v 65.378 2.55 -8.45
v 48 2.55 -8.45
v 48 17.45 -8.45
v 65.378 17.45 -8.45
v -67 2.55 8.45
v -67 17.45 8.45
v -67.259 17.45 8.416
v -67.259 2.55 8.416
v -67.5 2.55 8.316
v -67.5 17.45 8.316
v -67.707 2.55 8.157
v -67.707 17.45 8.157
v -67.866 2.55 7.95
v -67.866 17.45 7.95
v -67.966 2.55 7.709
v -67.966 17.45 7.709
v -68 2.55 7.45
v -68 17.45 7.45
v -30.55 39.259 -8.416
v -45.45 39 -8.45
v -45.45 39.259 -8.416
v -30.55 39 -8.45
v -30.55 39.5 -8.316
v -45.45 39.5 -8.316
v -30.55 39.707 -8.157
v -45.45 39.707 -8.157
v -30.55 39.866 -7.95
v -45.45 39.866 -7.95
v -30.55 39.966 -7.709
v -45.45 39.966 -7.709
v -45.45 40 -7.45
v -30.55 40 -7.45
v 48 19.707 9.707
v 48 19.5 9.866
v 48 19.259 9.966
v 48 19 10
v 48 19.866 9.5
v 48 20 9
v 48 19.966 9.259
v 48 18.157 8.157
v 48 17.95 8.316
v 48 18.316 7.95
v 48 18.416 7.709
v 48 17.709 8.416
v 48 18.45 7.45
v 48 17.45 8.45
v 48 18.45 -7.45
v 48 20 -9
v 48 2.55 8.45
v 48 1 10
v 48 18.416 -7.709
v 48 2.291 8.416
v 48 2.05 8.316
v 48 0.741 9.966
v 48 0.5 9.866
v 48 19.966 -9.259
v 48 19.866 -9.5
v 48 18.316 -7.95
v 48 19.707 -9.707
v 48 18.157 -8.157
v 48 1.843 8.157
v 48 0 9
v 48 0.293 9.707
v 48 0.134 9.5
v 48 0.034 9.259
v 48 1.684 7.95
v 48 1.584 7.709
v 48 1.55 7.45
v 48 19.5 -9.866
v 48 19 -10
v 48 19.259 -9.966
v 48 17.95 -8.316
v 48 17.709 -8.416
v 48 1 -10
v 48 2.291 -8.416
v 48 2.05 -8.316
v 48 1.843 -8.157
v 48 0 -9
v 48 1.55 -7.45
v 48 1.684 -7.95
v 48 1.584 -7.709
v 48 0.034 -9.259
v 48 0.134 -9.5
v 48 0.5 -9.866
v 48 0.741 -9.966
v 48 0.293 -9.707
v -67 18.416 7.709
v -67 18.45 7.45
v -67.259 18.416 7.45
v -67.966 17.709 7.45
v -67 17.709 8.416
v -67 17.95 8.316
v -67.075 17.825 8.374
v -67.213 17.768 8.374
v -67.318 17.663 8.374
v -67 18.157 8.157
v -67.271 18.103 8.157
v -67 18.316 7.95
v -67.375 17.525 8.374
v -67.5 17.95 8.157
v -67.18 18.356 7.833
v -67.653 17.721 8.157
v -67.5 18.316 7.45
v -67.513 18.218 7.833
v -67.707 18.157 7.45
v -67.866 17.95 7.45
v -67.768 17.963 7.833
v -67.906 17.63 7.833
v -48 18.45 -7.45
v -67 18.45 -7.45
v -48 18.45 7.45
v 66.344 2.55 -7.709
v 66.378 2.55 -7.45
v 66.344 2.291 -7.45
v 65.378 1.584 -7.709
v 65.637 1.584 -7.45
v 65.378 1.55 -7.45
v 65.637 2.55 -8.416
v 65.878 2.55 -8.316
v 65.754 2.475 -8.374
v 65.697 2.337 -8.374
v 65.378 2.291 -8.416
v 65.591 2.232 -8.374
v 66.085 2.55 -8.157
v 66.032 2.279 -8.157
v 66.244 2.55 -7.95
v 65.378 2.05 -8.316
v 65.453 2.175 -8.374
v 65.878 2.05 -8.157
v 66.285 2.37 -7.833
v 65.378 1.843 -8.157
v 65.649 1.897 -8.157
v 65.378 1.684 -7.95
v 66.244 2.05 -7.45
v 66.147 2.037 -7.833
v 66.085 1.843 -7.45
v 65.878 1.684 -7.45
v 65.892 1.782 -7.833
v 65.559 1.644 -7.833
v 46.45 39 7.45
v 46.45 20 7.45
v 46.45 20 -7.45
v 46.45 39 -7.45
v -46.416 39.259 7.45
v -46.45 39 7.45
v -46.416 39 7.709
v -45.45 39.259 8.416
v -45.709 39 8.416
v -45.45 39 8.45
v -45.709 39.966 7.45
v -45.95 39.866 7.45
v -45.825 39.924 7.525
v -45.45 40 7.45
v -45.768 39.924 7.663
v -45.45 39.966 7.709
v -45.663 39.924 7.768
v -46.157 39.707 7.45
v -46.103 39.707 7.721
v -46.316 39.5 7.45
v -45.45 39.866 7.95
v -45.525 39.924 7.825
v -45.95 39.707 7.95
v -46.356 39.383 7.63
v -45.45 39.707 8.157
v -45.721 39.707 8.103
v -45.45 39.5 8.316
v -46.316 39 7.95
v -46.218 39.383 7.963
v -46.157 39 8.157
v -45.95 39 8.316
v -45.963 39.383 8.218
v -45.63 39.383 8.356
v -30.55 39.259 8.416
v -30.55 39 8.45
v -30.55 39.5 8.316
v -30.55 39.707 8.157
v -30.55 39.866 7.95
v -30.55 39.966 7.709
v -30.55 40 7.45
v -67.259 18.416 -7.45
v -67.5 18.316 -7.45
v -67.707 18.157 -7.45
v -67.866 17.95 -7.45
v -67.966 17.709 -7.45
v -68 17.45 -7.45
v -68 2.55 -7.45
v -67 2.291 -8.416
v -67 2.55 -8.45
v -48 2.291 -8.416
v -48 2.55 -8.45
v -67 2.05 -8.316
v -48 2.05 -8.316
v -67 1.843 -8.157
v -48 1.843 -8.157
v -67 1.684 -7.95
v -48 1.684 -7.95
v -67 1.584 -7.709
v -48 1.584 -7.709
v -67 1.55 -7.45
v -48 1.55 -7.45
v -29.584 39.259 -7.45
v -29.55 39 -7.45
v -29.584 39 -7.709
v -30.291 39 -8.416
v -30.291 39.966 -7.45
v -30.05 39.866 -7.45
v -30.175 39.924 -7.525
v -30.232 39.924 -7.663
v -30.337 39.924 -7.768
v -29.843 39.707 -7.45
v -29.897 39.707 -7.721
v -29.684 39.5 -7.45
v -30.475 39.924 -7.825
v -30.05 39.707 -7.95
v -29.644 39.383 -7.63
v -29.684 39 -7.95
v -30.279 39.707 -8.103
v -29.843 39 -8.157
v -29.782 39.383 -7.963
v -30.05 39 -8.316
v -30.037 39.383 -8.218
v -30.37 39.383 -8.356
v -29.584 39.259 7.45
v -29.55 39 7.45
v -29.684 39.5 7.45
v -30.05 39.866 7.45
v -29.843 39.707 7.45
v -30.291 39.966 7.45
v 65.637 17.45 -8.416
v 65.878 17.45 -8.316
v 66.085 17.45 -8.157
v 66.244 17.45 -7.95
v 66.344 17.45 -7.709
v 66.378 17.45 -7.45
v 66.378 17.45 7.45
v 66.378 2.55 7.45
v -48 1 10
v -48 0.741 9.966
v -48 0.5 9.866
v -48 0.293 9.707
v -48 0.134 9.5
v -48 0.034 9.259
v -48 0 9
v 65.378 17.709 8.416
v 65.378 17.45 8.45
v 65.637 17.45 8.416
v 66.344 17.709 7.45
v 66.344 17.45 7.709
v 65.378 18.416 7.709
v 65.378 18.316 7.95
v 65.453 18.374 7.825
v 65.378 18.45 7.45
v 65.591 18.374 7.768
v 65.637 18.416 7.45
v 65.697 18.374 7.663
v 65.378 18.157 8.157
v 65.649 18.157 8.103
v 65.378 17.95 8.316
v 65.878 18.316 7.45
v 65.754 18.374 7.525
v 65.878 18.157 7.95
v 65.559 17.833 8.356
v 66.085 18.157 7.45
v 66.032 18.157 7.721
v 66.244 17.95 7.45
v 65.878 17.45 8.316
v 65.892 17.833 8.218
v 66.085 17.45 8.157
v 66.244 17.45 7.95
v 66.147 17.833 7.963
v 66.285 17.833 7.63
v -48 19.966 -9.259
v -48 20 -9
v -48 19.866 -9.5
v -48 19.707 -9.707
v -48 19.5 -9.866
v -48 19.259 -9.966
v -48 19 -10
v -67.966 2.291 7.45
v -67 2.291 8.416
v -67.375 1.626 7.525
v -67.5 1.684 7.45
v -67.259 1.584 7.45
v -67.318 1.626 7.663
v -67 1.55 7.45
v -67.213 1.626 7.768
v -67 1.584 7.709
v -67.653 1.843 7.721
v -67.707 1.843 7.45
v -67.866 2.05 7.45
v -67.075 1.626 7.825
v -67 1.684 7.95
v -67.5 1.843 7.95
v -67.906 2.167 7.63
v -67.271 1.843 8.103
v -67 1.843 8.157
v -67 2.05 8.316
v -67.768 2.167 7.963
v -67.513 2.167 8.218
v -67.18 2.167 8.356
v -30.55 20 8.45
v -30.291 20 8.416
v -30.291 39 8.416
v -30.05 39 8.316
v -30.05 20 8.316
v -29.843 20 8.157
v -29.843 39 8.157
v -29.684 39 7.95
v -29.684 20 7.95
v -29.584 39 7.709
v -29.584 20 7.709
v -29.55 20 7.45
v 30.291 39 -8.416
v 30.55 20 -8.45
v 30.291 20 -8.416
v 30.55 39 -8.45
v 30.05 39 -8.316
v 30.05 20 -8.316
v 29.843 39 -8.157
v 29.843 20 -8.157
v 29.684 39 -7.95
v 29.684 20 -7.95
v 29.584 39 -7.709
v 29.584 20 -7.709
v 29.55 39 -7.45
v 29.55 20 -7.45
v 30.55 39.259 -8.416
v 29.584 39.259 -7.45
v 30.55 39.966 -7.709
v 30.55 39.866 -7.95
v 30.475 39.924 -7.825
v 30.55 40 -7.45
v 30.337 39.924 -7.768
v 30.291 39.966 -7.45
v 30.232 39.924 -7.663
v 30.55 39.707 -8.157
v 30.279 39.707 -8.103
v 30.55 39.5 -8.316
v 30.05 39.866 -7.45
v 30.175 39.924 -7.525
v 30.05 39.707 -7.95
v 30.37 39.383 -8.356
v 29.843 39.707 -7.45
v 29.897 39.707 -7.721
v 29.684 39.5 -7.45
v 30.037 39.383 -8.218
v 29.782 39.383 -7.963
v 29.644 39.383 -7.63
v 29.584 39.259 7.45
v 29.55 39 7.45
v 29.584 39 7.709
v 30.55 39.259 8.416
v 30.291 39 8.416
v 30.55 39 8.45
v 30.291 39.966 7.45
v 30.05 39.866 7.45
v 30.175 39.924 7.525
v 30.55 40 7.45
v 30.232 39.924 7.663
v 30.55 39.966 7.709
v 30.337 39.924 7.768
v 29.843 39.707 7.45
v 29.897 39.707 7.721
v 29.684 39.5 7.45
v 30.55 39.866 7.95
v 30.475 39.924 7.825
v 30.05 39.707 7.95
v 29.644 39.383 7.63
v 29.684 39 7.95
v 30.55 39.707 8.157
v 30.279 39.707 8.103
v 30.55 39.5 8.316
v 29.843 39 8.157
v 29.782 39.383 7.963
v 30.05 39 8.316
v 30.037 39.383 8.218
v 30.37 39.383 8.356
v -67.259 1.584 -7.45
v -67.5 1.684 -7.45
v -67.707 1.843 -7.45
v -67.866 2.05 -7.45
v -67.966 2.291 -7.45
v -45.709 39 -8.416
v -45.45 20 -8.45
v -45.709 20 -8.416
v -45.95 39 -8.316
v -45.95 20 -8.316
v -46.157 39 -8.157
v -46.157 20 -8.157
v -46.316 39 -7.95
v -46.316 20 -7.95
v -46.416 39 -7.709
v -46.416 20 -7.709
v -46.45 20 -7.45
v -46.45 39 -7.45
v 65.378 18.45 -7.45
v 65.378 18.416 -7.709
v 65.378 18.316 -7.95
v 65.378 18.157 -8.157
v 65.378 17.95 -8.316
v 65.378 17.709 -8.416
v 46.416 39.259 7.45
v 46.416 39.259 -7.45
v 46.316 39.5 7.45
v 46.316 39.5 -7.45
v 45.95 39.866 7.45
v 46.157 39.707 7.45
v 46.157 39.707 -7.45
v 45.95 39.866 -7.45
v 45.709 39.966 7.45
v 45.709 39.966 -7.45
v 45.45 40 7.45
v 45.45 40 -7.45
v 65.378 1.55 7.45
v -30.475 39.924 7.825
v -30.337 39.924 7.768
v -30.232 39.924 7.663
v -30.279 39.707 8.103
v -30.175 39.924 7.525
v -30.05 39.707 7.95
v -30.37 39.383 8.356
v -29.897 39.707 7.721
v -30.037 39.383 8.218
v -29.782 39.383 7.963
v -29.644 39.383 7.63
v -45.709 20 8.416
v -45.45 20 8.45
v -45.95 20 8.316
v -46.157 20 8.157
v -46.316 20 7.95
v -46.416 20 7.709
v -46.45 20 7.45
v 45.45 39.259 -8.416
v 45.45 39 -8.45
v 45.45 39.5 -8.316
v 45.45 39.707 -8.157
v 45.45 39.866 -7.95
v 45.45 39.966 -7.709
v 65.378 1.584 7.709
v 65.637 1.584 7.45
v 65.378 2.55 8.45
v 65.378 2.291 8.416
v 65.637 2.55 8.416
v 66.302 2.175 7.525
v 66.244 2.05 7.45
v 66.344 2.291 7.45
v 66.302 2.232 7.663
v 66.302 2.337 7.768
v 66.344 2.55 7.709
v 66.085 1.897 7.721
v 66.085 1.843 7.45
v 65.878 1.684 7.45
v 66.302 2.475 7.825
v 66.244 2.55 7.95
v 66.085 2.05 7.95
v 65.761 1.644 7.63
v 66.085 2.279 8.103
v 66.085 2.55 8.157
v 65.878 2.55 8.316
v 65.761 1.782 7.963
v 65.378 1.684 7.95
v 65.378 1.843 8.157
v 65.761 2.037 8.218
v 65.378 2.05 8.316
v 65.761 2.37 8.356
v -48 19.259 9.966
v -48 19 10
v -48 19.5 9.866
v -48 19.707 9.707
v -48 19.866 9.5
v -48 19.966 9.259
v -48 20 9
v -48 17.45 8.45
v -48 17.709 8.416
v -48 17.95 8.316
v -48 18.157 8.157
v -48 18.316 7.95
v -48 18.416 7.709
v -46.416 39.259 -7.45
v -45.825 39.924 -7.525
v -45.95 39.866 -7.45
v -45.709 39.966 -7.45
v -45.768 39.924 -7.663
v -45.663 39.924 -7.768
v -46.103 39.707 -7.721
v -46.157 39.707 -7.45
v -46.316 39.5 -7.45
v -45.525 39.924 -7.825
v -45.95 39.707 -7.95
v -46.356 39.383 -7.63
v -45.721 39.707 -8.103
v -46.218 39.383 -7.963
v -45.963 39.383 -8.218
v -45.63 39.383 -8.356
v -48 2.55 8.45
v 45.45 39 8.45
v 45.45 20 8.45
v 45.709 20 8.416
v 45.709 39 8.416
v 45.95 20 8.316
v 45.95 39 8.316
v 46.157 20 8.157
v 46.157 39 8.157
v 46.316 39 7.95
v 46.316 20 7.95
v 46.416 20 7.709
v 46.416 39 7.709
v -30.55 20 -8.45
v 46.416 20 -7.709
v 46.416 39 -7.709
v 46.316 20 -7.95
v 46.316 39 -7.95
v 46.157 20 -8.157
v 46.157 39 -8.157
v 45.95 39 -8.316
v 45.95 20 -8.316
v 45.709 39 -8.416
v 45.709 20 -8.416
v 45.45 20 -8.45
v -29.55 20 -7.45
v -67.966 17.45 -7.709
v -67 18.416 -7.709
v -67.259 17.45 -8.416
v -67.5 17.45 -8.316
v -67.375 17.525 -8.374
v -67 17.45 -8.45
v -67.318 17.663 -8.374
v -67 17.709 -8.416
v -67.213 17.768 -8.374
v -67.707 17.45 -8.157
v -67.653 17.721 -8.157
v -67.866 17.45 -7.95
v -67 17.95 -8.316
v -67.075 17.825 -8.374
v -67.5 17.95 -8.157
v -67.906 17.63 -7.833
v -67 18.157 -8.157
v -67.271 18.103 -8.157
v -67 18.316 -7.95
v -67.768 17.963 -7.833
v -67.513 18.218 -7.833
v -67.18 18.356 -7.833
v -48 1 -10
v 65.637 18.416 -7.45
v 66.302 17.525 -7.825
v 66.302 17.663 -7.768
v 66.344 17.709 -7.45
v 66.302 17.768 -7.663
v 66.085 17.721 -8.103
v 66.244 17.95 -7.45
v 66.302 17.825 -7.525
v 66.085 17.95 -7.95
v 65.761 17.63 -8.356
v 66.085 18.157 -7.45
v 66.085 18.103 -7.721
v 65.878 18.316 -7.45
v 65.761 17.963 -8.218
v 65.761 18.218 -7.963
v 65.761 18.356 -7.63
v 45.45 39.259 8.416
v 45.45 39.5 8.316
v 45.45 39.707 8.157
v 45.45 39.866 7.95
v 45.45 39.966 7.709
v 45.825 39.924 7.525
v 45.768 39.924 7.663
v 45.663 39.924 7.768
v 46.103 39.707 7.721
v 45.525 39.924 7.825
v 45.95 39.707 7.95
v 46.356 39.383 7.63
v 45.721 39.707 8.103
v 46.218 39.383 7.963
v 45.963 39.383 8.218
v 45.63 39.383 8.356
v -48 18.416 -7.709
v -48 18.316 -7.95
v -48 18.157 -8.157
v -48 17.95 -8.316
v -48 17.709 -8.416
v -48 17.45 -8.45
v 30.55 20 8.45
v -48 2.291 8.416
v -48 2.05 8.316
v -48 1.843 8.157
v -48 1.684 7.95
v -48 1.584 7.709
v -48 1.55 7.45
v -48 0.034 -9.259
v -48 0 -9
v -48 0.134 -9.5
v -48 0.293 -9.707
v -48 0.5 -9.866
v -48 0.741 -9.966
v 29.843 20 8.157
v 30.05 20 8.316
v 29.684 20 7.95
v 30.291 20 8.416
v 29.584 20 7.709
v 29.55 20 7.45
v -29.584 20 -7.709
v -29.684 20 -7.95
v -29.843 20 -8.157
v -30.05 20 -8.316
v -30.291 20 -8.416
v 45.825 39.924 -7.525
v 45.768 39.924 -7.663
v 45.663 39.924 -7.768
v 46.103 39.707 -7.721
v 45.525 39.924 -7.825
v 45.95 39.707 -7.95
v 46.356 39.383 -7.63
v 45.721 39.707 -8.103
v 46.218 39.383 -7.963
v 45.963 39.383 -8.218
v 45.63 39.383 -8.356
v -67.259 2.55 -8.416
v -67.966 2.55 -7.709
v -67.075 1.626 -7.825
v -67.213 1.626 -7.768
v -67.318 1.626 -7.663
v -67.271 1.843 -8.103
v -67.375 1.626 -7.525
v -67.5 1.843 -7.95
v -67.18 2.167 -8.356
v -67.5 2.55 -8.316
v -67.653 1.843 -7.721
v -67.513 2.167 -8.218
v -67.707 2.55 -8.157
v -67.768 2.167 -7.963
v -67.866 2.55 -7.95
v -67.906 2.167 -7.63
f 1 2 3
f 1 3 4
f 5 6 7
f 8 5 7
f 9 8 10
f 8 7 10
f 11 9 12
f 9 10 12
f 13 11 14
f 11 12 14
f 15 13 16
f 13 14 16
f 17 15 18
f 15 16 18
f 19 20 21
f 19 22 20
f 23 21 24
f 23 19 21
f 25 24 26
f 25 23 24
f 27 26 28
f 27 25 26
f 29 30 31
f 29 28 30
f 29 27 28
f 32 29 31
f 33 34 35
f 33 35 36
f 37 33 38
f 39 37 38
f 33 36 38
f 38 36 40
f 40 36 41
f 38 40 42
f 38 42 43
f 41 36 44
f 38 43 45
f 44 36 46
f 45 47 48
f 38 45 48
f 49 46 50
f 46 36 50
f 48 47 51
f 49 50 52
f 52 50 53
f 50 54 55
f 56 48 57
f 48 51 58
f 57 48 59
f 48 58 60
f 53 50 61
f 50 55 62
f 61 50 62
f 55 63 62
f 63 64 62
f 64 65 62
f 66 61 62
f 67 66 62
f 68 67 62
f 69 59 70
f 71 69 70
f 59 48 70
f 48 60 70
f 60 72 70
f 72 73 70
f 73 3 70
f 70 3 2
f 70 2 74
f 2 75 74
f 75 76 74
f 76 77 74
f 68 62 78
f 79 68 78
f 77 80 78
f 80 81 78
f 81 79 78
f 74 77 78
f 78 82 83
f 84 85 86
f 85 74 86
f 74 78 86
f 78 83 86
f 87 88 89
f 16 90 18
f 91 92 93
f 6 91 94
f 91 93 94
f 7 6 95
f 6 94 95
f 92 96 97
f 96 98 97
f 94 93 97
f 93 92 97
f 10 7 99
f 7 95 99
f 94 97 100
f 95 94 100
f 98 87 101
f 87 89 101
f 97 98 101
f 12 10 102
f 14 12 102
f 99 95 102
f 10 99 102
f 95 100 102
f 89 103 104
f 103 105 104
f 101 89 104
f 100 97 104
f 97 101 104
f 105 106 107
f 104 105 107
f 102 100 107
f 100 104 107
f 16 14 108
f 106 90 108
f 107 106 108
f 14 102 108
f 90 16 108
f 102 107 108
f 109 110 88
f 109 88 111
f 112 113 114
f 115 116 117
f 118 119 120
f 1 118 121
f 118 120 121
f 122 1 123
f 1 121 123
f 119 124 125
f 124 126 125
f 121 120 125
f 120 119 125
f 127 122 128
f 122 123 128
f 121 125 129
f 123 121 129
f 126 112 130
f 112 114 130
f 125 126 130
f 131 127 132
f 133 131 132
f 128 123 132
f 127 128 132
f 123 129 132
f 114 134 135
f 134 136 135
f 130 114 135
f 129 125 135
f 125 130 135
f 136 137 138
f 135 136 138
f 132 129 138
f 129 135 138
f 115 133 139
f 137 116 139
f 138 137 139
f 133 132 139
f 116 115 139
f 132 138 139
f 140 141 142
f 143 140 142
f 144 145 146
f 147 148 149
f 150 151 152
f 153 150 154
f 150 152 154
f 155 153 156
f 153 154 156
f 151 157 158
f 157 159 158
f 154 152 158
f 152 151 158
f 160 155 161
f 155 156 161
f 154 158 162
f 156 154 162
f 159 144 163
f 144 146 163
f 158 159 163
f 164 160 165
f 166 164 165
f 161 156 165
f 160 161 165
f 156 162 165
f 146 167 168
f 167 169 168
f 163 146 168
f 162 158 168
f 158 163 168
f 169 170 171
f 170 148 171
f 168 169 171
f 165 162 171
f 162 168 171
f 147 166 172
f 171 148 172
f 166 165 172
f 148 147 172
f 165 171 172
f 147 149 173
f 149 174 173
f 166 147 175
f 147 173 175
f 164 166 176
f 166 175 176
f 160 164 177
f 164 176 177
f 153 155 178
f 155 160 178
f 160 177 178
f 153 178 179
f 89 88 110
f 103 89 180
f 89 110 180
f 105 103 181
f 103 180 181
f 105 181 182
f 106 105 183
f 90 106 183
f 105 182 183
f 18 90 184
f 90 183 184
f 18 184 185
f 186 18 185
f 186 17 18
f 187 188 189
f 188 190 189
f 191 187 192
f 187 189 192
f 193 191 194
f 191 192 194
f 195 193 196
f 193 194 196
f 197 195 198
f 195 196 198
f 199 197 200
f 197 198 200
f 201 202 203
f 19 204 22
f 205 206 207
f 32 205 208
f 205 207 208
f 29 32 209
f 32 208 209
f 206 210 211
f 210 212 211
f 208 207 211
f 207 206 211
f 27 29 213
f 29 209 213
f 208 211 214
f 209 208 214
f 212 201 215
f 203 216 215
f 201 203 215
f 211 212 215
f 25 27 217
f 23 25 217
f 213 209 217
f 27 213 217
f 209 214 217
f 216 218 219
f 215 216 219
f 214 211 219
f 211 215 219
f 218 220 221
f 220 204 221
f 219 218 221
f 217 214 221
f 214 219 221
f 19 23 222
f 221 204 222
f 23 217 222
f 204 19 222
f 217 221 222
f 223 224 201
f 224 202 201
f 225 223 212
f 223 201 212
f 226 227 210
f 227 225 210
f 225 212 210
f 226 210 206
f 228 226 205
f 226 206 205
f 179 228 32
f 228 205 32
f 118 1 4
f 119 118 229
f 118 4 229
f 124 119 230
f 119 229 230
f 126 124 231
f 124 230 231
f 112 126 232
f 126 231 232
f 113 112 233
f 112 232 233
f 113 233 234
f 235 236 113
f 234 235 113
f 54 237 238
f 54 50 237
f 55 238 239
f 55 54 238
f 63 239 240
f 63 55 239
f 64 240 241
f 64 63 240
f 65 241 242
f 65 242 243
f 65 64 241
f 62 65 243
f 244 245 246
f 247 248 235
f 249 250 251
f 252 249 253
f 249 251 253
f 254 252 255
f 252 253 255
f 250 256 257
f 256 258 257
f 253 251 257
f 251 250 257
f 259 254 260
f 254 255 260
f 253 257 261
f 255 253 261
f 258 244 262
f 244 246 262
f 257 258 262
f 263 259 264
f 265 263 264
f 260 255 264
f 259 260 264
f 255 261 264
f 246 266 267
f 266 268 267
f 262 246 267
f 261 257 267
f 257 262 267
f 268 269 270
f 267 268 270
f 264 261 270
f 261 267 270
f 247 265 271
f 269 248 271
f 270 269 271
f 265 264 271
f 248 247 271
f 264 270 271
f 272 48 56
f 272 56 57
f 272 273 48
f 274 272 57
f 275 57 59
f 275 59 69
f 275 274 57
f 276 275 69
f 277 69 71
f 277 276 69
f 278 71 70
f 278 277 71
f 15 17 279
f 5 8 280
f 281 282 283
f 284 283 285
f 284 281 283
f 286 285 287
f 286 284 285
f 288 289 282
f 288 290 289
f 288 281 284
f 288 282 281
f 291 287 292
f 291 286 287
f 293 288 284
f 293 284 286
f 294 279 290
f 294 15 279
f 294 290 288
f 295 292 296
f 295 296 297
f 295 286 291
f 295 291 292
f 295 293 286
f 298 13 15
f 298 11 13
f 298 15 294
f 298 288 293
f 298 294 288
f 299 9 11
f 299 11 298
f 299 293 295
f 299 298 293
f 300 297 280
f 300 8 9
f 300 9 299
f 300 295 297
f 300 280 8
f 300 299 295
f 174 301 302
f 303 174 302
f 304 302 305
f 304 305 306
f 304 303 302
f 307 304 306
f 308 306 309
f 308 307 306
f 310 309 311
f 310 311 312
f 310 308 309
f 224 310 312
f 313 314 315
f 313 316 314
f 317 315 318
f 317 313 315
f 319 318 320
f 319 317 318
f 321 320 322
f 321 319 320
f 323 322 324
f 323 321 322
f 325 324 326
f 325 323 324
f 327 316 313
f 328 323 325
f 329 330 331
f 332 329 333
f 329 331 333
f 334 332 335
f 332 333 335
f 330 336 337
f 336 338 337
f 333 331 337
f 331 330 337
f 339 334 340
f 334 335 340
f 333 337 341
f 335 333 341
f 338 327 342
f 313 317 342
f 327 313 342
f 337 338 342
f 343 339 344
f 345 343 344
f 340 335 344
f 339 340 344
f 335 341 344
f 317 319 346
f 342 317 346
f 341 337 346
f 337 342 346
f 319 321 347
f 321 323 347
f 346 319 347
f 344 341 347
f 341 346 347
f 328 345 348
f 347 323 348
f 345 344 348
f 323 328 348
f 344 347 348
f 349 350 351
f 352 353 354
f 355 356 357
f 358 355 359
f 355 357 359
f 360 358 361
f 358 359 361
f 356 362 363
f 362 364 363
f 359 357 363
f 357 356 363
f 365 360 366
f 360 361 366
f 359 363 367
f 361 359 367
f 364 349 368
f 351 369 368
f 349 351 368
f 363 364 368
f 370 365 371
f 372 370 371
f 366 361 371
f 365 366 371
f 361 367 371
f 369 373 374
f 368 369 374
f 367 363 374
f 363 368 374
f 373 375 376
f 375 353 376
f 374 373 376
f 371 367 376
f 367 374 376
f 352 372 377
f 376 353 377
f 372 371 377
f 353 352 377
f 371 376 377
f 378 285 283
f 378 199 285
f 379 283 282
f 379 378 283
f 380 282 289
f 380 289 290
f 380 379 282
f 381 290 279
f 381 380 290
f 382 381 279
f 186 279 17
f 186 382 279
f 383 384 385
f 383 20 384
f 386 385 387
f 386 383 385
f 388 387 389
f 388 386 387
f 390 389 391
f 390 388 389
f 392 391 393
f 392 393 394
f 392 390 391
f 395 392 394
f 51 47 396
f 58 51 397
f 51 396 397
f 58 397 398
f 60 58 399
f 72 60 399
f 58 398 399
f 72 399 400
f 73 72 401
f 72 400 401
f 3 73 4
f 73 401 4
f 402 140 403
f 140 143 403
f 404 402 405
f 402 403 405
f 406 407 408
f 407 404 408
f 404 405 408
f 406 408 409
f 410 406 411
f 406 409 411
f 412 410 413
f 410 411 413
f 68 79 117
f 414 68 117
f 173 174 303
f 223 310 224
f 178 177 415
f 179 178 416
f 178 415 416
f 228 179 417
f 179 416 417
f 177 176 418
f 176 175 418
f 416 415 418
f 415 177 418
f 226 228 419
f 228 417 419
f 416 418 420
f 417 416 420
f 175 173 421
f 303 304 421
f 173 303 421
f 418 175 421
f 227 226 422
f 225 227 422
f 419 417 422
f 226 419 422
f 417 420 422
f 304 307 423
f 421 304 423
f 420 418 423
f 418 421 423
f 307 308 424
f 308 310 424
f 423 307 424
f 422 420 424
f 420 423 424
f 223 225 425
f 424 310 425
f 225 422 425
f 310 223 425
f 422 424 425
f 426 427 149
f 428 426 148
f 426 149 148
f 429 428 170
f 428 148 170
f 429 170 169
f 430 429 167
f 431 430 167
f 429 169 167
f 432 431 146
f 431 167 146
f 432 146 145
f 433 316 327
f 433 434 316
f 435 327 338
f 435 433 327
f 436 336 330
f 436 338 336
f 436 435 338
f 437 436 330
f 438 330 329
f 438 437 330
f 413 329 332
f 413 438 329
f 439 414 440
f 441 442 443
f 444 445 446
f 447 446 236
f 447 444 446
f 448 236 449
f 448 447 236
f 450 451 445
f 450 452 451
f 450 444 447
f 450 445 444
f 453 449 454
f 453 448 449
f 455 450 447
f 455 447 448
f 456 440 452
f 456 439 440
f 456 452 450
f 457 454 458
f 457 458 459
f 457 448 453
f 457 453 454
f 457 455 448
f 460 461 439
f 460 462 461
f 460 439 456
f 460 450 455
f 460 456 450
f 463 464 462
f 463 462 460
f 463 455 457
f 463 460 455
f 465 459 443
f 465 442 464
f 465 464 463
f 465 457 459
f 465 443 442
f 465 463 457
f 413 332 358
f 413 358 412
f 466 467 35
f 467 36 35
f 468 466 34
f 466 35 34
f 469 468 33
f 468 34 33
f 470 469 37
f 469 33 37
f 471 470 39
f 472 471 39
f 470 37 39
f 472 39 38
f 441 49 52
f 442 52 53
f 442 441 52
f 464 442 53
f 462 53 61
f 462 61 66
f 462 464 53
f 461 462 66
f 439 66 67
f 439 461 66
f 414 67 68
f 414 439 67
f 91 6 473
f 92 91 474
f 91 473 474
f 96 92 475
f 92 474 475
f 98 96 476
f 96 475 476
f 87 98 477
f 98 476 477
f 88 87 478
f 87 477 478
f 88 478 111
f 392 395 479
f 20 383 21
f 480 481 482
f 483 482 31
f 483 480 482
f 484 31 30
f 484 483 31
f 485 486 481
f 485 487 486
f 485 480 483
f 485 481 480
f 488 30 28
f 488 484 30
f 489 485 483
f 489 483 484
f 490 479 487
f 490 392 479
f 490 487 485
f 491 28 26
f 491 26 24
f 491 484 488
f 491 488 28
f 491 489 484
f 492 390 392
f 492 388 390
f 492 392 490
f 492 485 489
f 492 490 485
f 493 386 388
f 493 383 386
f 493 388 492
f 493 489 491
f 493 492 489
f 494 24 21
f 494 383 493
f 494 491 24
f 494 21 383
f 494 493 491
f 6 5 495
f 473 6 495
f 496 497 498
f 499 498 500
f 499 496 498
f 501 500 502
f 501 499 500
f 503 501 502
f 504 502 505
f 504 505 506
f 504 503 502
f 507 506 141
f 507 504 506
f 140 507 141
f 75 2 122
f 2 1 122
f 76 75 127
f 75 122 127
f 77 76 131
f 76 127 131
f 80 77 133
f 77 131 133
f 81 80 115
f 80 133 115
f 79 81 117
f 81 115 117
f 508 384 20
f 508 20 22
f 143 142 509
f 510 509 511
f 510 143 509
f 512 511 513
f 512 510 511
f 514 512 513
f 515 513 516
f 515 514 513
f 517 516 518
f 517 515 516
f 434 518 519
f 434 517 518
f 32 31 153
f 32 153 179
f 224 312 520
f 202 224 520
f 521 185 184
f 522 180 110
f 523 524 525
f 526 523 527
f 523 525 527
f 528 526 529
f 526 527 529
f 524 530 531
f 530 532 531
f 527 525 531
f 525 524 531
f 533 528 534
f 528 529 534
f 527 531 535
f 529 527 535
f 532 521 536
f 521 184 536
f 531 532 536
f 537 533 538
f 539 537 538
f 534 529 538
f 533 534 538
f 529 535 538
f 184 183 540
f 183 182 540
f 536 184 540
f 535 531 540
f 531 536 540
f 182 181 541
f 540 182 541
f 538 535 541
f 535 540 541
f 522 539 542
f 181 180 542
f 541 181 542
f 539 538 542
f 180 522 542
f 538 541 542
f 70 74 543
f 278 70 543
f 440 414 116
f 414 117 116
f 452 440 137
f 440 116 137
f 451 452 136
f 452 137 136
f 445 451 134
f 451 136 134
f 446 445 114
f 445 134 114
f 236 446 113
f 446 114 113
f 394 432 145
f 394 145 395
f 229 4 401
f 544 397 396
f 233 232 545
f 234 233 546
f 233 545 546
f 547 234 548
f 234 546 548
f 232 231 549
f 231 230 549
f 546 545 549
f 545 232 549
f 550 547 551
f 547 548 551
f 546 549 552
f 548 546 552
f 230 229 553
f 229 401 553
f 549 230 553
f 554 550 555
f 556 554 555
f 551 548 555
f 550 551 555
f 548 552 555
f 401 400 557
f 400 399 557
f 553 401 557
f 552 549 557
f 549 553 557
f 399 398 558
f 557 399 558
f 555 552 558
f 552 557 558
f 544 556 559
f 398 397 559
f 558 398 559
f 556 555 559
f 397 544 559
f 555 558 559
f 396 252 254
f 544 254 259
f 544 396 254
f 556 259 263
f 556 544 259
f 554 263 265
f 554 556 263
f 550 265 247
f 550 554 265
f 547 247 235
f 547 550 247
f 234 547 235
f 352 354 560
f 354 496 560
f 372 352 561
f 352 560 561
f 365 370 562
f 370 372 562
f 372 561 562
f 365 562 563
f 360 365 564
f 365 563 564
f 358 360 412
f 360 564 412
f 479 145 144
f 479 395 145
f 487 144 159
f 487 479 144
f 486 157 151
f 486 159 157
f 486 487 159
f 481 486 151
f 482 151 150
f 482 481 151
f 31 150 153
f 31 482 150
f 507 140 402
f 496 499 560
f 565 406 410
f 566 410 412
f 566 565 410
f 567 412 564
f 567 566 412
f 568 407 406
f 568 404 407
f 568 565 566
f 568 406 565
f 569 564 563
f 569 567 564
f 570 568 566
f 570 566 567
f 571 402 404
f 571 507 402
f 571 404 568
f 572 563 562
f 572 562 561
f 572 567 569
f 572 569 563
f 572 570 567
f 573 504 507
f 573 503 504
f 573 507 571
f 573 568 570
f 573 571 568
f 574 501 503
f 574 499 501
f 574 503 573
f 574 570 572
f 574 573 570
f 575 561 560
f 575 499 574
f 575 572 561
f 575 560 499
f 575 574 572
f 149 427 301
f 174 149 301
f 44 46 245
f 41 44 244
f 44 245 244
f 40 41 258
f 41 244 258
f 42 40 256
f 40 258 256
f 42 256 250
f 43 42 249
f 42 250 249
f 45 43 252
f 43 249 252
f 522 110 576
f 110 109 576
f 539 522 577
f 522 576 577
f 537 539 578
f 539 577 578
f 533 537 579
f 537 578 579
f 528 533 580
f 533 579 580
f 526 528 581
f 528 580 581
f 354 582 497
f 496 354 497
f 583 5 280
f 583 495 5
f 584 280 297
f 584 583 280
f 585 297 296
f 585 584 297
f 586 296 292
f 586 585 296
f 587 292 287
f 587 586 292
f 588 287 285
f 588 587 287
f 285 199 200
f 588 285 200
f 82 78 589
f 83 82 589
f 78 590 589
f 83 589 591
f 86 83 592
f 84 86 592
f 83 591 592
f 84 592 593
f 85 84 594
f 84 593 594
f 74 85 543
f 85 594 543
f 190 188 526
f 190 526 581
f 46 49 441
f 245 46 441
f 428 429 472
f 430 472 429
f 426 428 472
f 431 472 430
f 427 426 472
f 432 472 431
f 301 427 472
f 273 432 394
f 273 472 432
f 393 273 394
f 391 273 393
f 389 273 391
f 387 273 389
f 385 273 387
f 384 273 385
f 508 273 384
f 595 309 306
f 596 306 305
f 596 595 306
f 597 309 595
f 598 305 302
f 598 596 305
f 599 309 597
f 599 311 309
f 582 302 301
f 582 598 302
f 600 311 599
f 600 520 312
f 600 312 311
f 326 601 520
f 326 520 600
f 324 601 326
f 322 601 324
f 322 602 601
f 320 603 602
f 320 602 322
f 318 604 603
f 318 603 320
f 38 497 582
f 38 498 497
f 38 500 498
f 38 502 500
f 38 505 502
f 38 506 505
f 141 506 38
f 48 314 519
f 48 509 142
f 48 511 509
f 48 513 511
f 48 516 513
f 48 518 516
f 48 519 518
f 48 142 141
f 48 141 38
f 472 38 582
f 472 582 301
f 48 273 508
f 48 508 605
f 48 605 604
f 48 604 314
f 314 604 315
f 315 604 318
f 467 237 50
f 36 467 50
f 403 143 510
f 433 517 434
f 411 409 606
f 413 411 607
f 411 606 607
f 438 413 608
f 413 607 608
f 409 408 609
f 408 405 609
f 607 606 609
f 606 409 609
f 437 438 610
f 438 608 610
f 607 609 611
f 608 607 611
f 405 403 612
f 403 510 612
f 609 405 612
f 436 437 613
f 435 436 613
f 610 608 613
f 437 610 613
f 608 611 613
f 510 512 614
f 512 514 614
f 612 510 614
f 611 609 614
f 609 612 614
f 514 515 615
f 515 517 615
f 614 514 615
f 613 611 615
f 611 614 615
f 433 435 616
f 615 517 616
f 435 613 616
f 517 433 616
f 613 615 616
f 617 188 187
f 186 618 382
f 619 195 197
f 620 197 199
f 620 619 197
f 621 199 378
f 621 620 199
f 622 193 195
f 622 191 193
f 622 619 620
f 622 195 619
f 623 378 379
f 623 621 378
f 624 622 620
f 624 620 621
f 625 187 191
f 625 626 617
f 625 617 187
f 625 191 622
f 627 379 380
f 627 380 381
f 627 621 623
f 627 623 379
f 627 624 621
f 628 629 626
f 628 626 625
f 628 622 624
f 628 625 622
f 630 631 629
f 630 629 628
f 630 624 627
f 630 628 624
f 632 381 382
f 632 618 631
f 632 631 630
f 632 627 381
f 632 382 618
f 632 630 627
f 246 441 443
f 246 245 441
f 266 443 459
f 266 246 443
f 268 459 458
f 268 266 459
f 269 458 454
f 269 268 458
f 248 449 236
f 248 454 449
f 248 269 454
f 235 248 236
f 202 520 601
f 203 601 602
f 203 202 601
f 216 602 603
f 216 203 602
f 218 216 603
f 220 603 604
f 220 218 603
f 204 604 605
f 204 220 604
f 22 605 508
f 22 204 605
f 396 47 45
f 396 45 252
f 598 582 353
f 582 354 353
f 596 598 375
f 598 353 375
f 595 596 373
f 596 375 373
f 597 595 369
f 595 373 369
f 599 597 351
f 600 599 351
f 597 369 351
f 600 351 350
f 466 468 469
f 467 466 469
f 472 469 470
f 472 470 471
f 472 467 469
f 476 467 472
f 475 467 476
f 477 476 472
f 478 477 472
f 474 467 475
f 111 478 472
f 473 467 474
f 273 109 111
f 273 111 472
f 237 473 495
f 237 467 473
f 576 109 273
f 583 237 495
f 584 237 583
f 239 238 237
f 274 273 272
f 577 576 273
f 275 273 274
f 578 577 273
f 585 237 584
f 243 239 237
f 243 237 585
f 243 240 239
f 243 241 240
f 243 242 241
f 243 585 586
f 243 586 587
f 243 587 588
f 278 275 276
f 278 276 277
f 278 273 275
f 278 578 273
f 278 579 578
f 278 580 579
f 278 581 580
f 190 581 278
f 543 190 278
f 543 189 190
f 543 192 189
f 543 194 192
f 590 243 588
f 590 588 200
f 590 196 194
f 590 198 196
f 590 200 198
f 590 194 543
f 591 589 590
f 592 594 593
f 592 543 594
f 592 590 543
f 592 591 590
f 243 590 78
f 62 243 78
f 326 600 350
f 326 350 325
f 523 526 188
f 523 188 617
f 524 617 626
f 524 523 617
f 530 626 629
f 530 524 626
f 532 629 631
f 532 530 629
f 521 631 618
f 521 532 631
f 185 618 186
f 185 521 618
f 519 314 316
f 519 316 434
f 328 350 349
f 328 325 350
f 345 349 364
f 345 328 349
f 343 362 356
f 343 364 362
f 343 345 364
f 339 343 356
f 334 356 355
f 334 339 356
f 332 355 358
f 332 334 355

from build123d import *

# Parameters (mm, degrees)
SKETCH1_W           = 96
SKETCH1_H           = 20
BOSS_EXTRUDE1_DEPTH = 20
BOSS_EXTRUDE2_START = 1.55
SKETCH1_3_W         = 20
SKETCH1_3_H         = 16.9
SKETCH1_3_W_2       = 18.378378378
BOSS_EXTRUDE2_DEPTH = 16.9
SKETCH2_W           = 16.9
SKETCH2_H           = 16.9
BOSS_EXTRUDE3_DEPTH = 20
FILLET2_R           = 1


with BuildPart() as part:
    # Sketch1 → Boss-Extrude1 (new body)
    with BuildSketch(Plane(origin=(0, 0, 0), x_dir=(1, 0, 0), z_dir=(0, 1, 0))):
        Rectangle(SKETCH1_W, SKETCH1_H)
    extrude(amount=BOSS_EXTRUDE1_DEPTH)

    # Sketch1<3> → Boss-Extrude2 (add)
    with BuildSketch(Plane(origin=(0, 0, 0), x_dir=(1, 0, 0), z_dir=(0, 1, 0)).offset(BOSS_EXTRUDE2_START)):
        with Locations((-58, 0)):
            Rectangle(SKETCH1_3_W, SKETCH1_3_H)
        with Locations((57.189189189, 0)):
            Rectangle(SKETCH1_3_W_2, SKETCH1_3_H)
    extrude(amount=BOSS_EXTRUDE2_DEPTH)

    # Sketch2 → Boss-Extrude3 (add)
    with BuildSketch(Plane(origin=(0, 20, 0), x_dir=(1, 0, 0), z_dir=(0, 1, 0))):
        with Locations((38, 0)):
            Rectangle(SKETCH2_W, SKETCH2_H)
        with Locations((-38, 0)):
            Rectangle(SKETCH2_W, SKETCH2_H)
    extrude(amount=BOSS_EXTRUDE3_DEPTH)

    # Fillet2
    fillet2_edges = [part.edges().sort_by_distance(p)[0] for p in [
        (-58, 18.45, 8.45),
        (-46.45, 30, 8.45),
        (-46.45, 30, -8.45),
        (-38, 40, -8.45),
        (-46.45, 40, 0),
        (-38, 40, 8.45),
        (-29.55, 40, 0),
        (-29.55, 30, 8.45),
        (-29.55, 30, -8.45),
        (29.55, 30, -8.45),
        (29.55, 30, 8.45),
        (38, 40, -8.45),
        (29.55, 40, 0),
        (38, 40, 8.45),
        (46.45, 40, 0),
        (46.45, 30, -8.45),
        (46.45, 30, 8.45),
        (57.189189189, 1.55, -8.45),
        (0, 0, -10),
        (57.189189189, 18.45, -8.45),
        (66.378378378, 10, -8.45),
        (66.378378378, 18.45, 0),
        (66.378378378, 10, 8.45),
        (57.189189189, 1.55, 8.45),
        (66.378378378, 1.55, 0),
        (57.189189189, 18.45, 8.45),
        (0, 20, -10),
        (0, 0, 10),
        (0, 20, 10),
        (-58, 1.55, -8.45),
        (-68, 1.55, 0),
        (-58, 1.55, 8.45),
        (-68, 10, -8.45),
        (-58, 18.45, -8.45),
        (-68, 18.45, 0),
        (-68, 10, 8.45),
    ]]
    fillet(fillet2_edges, radius=FILLET2_R)


solid = part.part
